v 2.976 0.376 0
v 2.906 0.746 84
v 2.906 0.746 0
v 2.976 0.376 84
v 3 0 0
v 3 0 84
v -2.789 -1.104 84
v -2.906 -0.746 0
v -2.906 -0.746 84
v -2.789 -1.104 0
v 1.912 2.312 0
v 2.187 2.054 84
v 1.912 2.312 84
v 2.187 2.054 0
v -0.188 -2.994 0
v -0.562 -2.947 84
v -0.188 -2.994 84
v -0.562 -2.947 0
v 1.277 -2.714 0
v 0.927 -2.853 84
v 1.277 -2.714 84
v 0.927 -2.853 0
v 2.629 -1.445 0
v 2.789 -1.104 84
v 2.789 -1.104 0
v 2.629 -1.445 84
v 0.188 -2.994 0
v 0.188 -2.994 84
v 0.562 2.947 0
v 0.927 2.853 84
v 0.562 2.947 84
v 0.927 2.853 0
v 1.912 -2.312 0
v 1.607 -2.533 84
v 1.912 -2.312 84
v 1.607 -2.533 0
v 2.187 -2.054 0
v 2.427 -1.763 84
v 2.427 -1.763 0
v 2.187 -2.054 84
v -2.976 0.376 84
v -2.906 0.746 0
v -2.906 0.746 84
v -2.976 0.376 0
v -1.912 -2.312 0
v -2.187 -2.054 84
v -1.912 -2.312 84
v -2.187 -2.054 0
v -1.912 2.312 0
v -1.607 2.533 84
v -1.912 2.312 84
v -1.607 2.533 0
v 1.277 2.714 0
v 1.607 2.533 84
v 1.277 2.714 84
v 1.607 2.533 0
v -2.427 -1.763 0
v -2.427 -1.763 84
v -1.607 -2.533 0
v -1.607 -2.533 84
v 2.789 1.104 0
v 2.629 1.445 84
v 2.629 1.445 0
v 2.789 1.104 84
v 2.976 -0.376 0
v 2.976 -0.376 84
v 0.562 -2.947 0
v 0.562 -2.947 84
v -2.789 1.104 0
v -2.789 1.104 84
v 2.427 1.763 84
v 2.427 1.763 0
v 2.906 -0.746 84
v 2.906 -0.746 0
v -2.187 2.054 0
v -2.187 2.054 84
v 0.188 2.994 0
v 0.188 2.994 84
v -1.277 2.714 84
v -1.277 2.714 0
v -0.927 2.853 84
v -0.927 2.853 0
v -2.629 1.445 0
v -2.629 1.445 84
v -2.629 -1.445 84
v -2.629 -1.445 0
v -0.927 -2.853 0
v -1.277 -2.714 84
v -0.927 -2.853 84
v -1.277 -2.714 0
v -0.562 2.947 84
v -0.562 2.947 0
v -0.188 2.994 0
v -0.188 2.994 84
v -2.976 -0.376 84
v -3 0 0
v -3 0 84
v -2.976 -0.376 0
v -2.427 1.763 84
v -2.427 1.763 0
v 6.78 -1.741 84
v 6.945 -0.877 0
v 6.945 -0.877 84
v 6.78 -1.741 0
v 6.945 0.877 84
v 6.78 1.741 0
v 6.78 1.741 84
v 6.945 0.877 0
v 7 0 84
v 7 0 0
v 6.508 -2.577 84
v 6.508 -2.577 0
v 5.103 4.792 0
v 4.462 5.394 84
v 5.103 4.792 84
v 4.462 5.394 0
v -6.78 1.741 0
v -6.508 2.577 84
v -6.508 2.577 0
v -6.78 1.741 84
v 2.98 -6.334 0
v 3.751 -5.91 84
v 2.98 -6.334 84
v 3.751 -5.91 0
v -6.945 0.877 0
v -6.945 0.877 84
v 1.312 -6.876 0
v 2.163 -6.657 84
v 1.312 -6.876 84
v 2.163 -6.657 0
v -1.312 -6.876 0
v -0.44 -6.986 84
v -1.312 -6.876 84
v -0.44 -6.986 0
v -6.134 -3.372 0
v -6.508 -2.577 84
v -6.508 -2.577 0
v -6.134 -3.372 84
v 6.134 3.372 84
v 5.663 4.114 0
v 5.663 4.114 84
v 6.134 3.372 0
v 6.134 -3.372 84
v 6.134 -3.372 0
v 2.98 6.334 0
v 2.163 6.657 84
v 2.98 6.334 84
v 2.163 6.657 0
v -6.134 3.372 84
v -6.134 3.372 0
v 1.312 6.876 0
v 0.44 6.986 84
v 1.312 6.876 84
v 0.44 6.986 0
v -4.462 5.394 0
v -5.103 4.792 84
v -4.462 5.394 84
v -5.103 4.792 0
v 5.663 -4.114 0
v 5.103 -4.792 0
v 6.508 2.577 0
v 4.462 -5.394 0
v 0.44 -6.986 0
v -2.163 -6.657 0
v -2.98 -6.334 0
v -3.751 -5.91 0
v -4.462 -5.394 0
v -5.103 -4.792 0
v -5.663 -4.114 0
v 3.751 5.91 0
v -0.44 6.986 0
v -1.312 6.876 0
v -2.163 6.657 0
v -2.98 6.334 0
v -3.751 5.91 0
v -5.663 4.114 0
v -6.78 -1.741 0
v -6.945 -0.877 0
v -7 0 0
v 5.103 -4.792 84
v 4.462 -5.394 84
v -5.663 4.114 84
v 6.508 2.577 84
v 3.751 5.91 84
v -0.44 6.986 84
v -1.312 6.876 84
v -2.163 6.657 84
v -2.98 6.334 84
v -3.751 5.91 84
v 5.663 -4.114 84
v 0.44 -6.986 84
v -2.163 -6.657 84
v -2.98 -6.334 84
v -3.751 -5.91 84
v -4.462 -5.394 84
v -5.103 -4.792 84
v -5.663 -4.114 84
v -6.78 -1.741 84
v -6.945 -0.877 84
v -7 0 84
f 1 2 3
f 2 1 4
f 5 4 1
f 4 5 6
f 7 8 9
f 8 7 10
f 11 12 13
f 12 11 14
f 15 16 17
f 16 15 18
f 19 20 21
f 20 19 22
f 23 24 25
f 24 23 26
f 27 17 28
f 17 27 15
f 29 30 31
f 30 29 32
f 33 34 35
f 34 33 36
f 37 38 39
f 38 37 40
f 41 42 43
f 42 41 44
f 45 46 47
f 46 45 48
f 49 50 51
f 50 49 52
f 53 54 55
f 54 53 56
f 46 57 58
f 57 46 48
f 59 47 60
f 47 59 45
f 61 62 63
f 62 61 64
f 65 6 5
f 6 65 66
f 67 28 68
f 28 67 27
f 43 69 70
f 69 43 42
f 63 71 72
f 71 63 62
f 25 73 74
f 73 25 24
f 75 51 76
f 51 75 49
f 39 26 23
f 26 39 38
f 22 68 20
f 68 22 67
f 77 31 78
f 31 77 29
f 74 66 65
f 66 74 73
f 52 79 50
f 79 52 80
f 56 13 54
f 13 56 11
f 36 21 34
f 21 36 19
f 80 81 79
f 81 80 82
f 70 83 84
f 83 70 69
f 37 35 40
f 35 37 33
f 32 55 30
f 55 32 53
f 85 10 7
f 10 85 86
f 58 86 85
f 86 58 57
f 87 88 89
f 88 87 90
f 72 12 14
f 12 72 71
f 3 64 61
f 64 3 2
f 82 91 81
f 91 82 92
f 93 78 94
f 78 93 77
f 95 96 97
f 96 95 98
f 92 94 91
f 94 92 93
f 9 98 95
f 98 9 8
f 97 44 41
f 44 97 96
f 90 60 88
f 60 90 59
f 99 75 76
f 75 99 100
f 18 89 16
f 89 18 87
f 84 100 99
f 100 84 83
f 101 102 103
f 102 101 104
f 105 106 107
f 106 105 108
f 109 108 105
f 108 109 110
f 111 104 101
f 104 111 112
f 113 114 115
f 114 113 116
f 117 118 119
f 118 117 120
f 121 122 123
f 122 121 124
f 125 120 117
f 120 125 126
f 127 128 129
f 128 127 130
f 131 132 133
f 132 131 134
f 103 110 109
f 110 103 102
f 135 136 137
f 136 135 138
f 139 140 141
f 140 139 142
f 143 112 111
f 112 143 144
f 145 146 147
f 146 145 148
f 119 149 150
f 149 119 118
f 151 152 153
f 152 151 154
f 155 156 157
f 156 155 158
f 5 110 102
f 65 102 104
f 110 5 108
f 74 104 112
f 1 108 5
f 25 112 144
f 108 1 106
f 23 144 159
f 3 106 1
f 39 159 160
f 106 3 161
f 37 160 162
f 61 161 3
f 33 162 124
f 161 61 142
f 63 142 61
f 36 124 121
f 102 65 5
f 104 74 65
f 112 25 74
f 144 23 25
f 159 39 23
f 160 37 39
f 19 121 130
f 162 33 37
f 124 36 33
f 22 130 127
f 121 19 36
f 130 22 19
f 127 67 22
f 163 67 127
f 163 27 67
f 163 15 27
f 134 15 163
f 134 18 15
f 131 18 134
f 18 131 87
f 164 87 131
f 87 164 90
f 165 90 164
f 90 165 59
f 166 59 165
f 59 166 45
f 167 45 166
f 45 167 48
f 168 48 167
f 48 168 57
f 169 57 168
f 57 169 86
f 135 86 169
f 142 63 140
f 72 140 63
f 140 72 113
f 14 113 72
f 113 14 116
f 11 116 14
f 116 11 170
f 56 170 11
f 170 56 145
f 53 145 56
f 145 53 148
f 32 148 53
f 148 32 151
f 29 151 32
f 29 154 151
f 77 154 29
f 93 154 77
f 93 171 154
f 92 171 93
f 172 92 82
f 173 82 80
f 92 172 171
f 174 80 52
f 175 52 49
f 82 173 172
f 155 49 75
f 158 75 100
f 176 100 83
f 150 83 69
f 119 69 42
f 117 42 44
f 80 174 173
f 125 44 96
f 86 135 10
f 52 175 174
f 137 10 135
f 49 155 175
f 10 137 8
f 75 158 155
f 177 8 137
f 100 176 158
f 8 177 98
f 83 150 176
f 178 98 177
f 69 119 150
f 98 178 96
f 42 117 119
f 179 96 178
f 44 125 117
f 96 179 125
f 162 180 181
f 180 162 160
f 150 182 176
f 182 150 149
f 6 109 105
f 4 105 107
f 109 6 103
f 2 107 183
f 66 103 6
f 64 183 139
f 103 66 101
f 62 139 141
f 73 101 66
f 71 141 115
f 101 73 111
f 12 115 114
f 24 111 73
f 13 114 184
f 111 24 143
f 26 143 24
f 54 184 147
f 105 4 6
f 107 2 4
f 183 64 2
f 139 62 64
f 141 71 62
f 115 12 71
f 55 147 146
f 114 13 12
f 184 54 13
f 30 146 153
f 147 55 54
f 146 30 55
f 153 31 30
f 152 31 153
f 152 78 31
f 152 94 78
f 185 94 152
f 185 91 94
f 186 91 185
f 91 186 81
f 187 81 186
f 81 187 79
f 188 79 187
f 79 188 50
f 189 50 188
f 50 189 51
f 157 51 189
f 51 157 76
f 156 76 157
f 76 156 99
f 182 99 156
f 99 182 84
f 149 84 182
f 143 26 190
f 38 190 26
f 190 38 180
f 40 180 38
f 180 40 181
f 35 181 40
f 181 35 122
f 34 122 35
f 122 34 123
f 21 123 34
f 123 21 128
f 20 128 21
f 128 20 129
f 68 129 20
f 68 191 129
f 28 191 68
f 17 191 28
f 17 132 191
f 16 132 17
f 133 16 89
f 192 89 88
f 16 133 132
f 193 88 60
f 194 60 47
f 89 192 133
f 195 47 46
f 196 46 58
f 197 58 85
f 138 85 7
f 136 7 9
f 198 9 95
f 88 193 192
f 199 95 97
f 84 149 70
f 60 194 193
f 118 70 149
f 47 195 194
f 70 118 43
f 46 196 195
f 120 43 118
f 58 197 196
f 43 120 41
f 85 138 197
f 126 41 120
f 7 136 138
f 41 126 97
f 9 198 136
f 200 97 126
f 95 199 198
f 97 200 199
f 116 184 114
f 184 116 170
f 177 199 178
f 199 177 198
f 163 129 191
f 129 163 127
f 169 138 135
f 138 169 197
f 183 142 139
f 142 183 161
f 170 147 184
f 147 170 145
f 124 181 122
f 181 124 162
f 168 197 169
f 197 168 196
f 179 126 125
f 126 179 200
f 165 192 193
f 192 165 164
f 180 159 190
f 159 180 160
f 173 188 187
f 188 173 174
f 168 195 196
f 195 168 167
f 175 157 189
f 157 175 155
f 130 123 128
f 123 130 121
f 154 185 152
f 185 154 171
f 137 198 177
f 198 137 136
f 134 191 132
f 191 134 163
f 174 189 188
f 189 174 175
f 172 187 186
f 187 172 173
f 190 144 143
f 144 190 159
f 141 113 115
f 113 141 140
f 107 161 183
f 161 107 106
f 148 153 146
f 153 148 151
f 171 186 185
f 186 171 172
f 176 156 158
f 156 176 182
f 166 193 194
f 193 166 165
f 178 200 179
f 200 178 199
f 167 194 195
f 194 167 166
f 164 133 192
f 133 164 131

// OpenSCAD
$fn = 50;


difference() {
	union() {
		cylinder(h = 84, r = 7.0000000000);
	}
	union() {
		translate(v = [0, 0, -100]) {
			cylinder(h = 200, r = 3.0000000000);
		}
		translate(v = [0, 0, -100]) {
			cylinder(h = 200, r = 1.5000000000);
		}
	}
}
